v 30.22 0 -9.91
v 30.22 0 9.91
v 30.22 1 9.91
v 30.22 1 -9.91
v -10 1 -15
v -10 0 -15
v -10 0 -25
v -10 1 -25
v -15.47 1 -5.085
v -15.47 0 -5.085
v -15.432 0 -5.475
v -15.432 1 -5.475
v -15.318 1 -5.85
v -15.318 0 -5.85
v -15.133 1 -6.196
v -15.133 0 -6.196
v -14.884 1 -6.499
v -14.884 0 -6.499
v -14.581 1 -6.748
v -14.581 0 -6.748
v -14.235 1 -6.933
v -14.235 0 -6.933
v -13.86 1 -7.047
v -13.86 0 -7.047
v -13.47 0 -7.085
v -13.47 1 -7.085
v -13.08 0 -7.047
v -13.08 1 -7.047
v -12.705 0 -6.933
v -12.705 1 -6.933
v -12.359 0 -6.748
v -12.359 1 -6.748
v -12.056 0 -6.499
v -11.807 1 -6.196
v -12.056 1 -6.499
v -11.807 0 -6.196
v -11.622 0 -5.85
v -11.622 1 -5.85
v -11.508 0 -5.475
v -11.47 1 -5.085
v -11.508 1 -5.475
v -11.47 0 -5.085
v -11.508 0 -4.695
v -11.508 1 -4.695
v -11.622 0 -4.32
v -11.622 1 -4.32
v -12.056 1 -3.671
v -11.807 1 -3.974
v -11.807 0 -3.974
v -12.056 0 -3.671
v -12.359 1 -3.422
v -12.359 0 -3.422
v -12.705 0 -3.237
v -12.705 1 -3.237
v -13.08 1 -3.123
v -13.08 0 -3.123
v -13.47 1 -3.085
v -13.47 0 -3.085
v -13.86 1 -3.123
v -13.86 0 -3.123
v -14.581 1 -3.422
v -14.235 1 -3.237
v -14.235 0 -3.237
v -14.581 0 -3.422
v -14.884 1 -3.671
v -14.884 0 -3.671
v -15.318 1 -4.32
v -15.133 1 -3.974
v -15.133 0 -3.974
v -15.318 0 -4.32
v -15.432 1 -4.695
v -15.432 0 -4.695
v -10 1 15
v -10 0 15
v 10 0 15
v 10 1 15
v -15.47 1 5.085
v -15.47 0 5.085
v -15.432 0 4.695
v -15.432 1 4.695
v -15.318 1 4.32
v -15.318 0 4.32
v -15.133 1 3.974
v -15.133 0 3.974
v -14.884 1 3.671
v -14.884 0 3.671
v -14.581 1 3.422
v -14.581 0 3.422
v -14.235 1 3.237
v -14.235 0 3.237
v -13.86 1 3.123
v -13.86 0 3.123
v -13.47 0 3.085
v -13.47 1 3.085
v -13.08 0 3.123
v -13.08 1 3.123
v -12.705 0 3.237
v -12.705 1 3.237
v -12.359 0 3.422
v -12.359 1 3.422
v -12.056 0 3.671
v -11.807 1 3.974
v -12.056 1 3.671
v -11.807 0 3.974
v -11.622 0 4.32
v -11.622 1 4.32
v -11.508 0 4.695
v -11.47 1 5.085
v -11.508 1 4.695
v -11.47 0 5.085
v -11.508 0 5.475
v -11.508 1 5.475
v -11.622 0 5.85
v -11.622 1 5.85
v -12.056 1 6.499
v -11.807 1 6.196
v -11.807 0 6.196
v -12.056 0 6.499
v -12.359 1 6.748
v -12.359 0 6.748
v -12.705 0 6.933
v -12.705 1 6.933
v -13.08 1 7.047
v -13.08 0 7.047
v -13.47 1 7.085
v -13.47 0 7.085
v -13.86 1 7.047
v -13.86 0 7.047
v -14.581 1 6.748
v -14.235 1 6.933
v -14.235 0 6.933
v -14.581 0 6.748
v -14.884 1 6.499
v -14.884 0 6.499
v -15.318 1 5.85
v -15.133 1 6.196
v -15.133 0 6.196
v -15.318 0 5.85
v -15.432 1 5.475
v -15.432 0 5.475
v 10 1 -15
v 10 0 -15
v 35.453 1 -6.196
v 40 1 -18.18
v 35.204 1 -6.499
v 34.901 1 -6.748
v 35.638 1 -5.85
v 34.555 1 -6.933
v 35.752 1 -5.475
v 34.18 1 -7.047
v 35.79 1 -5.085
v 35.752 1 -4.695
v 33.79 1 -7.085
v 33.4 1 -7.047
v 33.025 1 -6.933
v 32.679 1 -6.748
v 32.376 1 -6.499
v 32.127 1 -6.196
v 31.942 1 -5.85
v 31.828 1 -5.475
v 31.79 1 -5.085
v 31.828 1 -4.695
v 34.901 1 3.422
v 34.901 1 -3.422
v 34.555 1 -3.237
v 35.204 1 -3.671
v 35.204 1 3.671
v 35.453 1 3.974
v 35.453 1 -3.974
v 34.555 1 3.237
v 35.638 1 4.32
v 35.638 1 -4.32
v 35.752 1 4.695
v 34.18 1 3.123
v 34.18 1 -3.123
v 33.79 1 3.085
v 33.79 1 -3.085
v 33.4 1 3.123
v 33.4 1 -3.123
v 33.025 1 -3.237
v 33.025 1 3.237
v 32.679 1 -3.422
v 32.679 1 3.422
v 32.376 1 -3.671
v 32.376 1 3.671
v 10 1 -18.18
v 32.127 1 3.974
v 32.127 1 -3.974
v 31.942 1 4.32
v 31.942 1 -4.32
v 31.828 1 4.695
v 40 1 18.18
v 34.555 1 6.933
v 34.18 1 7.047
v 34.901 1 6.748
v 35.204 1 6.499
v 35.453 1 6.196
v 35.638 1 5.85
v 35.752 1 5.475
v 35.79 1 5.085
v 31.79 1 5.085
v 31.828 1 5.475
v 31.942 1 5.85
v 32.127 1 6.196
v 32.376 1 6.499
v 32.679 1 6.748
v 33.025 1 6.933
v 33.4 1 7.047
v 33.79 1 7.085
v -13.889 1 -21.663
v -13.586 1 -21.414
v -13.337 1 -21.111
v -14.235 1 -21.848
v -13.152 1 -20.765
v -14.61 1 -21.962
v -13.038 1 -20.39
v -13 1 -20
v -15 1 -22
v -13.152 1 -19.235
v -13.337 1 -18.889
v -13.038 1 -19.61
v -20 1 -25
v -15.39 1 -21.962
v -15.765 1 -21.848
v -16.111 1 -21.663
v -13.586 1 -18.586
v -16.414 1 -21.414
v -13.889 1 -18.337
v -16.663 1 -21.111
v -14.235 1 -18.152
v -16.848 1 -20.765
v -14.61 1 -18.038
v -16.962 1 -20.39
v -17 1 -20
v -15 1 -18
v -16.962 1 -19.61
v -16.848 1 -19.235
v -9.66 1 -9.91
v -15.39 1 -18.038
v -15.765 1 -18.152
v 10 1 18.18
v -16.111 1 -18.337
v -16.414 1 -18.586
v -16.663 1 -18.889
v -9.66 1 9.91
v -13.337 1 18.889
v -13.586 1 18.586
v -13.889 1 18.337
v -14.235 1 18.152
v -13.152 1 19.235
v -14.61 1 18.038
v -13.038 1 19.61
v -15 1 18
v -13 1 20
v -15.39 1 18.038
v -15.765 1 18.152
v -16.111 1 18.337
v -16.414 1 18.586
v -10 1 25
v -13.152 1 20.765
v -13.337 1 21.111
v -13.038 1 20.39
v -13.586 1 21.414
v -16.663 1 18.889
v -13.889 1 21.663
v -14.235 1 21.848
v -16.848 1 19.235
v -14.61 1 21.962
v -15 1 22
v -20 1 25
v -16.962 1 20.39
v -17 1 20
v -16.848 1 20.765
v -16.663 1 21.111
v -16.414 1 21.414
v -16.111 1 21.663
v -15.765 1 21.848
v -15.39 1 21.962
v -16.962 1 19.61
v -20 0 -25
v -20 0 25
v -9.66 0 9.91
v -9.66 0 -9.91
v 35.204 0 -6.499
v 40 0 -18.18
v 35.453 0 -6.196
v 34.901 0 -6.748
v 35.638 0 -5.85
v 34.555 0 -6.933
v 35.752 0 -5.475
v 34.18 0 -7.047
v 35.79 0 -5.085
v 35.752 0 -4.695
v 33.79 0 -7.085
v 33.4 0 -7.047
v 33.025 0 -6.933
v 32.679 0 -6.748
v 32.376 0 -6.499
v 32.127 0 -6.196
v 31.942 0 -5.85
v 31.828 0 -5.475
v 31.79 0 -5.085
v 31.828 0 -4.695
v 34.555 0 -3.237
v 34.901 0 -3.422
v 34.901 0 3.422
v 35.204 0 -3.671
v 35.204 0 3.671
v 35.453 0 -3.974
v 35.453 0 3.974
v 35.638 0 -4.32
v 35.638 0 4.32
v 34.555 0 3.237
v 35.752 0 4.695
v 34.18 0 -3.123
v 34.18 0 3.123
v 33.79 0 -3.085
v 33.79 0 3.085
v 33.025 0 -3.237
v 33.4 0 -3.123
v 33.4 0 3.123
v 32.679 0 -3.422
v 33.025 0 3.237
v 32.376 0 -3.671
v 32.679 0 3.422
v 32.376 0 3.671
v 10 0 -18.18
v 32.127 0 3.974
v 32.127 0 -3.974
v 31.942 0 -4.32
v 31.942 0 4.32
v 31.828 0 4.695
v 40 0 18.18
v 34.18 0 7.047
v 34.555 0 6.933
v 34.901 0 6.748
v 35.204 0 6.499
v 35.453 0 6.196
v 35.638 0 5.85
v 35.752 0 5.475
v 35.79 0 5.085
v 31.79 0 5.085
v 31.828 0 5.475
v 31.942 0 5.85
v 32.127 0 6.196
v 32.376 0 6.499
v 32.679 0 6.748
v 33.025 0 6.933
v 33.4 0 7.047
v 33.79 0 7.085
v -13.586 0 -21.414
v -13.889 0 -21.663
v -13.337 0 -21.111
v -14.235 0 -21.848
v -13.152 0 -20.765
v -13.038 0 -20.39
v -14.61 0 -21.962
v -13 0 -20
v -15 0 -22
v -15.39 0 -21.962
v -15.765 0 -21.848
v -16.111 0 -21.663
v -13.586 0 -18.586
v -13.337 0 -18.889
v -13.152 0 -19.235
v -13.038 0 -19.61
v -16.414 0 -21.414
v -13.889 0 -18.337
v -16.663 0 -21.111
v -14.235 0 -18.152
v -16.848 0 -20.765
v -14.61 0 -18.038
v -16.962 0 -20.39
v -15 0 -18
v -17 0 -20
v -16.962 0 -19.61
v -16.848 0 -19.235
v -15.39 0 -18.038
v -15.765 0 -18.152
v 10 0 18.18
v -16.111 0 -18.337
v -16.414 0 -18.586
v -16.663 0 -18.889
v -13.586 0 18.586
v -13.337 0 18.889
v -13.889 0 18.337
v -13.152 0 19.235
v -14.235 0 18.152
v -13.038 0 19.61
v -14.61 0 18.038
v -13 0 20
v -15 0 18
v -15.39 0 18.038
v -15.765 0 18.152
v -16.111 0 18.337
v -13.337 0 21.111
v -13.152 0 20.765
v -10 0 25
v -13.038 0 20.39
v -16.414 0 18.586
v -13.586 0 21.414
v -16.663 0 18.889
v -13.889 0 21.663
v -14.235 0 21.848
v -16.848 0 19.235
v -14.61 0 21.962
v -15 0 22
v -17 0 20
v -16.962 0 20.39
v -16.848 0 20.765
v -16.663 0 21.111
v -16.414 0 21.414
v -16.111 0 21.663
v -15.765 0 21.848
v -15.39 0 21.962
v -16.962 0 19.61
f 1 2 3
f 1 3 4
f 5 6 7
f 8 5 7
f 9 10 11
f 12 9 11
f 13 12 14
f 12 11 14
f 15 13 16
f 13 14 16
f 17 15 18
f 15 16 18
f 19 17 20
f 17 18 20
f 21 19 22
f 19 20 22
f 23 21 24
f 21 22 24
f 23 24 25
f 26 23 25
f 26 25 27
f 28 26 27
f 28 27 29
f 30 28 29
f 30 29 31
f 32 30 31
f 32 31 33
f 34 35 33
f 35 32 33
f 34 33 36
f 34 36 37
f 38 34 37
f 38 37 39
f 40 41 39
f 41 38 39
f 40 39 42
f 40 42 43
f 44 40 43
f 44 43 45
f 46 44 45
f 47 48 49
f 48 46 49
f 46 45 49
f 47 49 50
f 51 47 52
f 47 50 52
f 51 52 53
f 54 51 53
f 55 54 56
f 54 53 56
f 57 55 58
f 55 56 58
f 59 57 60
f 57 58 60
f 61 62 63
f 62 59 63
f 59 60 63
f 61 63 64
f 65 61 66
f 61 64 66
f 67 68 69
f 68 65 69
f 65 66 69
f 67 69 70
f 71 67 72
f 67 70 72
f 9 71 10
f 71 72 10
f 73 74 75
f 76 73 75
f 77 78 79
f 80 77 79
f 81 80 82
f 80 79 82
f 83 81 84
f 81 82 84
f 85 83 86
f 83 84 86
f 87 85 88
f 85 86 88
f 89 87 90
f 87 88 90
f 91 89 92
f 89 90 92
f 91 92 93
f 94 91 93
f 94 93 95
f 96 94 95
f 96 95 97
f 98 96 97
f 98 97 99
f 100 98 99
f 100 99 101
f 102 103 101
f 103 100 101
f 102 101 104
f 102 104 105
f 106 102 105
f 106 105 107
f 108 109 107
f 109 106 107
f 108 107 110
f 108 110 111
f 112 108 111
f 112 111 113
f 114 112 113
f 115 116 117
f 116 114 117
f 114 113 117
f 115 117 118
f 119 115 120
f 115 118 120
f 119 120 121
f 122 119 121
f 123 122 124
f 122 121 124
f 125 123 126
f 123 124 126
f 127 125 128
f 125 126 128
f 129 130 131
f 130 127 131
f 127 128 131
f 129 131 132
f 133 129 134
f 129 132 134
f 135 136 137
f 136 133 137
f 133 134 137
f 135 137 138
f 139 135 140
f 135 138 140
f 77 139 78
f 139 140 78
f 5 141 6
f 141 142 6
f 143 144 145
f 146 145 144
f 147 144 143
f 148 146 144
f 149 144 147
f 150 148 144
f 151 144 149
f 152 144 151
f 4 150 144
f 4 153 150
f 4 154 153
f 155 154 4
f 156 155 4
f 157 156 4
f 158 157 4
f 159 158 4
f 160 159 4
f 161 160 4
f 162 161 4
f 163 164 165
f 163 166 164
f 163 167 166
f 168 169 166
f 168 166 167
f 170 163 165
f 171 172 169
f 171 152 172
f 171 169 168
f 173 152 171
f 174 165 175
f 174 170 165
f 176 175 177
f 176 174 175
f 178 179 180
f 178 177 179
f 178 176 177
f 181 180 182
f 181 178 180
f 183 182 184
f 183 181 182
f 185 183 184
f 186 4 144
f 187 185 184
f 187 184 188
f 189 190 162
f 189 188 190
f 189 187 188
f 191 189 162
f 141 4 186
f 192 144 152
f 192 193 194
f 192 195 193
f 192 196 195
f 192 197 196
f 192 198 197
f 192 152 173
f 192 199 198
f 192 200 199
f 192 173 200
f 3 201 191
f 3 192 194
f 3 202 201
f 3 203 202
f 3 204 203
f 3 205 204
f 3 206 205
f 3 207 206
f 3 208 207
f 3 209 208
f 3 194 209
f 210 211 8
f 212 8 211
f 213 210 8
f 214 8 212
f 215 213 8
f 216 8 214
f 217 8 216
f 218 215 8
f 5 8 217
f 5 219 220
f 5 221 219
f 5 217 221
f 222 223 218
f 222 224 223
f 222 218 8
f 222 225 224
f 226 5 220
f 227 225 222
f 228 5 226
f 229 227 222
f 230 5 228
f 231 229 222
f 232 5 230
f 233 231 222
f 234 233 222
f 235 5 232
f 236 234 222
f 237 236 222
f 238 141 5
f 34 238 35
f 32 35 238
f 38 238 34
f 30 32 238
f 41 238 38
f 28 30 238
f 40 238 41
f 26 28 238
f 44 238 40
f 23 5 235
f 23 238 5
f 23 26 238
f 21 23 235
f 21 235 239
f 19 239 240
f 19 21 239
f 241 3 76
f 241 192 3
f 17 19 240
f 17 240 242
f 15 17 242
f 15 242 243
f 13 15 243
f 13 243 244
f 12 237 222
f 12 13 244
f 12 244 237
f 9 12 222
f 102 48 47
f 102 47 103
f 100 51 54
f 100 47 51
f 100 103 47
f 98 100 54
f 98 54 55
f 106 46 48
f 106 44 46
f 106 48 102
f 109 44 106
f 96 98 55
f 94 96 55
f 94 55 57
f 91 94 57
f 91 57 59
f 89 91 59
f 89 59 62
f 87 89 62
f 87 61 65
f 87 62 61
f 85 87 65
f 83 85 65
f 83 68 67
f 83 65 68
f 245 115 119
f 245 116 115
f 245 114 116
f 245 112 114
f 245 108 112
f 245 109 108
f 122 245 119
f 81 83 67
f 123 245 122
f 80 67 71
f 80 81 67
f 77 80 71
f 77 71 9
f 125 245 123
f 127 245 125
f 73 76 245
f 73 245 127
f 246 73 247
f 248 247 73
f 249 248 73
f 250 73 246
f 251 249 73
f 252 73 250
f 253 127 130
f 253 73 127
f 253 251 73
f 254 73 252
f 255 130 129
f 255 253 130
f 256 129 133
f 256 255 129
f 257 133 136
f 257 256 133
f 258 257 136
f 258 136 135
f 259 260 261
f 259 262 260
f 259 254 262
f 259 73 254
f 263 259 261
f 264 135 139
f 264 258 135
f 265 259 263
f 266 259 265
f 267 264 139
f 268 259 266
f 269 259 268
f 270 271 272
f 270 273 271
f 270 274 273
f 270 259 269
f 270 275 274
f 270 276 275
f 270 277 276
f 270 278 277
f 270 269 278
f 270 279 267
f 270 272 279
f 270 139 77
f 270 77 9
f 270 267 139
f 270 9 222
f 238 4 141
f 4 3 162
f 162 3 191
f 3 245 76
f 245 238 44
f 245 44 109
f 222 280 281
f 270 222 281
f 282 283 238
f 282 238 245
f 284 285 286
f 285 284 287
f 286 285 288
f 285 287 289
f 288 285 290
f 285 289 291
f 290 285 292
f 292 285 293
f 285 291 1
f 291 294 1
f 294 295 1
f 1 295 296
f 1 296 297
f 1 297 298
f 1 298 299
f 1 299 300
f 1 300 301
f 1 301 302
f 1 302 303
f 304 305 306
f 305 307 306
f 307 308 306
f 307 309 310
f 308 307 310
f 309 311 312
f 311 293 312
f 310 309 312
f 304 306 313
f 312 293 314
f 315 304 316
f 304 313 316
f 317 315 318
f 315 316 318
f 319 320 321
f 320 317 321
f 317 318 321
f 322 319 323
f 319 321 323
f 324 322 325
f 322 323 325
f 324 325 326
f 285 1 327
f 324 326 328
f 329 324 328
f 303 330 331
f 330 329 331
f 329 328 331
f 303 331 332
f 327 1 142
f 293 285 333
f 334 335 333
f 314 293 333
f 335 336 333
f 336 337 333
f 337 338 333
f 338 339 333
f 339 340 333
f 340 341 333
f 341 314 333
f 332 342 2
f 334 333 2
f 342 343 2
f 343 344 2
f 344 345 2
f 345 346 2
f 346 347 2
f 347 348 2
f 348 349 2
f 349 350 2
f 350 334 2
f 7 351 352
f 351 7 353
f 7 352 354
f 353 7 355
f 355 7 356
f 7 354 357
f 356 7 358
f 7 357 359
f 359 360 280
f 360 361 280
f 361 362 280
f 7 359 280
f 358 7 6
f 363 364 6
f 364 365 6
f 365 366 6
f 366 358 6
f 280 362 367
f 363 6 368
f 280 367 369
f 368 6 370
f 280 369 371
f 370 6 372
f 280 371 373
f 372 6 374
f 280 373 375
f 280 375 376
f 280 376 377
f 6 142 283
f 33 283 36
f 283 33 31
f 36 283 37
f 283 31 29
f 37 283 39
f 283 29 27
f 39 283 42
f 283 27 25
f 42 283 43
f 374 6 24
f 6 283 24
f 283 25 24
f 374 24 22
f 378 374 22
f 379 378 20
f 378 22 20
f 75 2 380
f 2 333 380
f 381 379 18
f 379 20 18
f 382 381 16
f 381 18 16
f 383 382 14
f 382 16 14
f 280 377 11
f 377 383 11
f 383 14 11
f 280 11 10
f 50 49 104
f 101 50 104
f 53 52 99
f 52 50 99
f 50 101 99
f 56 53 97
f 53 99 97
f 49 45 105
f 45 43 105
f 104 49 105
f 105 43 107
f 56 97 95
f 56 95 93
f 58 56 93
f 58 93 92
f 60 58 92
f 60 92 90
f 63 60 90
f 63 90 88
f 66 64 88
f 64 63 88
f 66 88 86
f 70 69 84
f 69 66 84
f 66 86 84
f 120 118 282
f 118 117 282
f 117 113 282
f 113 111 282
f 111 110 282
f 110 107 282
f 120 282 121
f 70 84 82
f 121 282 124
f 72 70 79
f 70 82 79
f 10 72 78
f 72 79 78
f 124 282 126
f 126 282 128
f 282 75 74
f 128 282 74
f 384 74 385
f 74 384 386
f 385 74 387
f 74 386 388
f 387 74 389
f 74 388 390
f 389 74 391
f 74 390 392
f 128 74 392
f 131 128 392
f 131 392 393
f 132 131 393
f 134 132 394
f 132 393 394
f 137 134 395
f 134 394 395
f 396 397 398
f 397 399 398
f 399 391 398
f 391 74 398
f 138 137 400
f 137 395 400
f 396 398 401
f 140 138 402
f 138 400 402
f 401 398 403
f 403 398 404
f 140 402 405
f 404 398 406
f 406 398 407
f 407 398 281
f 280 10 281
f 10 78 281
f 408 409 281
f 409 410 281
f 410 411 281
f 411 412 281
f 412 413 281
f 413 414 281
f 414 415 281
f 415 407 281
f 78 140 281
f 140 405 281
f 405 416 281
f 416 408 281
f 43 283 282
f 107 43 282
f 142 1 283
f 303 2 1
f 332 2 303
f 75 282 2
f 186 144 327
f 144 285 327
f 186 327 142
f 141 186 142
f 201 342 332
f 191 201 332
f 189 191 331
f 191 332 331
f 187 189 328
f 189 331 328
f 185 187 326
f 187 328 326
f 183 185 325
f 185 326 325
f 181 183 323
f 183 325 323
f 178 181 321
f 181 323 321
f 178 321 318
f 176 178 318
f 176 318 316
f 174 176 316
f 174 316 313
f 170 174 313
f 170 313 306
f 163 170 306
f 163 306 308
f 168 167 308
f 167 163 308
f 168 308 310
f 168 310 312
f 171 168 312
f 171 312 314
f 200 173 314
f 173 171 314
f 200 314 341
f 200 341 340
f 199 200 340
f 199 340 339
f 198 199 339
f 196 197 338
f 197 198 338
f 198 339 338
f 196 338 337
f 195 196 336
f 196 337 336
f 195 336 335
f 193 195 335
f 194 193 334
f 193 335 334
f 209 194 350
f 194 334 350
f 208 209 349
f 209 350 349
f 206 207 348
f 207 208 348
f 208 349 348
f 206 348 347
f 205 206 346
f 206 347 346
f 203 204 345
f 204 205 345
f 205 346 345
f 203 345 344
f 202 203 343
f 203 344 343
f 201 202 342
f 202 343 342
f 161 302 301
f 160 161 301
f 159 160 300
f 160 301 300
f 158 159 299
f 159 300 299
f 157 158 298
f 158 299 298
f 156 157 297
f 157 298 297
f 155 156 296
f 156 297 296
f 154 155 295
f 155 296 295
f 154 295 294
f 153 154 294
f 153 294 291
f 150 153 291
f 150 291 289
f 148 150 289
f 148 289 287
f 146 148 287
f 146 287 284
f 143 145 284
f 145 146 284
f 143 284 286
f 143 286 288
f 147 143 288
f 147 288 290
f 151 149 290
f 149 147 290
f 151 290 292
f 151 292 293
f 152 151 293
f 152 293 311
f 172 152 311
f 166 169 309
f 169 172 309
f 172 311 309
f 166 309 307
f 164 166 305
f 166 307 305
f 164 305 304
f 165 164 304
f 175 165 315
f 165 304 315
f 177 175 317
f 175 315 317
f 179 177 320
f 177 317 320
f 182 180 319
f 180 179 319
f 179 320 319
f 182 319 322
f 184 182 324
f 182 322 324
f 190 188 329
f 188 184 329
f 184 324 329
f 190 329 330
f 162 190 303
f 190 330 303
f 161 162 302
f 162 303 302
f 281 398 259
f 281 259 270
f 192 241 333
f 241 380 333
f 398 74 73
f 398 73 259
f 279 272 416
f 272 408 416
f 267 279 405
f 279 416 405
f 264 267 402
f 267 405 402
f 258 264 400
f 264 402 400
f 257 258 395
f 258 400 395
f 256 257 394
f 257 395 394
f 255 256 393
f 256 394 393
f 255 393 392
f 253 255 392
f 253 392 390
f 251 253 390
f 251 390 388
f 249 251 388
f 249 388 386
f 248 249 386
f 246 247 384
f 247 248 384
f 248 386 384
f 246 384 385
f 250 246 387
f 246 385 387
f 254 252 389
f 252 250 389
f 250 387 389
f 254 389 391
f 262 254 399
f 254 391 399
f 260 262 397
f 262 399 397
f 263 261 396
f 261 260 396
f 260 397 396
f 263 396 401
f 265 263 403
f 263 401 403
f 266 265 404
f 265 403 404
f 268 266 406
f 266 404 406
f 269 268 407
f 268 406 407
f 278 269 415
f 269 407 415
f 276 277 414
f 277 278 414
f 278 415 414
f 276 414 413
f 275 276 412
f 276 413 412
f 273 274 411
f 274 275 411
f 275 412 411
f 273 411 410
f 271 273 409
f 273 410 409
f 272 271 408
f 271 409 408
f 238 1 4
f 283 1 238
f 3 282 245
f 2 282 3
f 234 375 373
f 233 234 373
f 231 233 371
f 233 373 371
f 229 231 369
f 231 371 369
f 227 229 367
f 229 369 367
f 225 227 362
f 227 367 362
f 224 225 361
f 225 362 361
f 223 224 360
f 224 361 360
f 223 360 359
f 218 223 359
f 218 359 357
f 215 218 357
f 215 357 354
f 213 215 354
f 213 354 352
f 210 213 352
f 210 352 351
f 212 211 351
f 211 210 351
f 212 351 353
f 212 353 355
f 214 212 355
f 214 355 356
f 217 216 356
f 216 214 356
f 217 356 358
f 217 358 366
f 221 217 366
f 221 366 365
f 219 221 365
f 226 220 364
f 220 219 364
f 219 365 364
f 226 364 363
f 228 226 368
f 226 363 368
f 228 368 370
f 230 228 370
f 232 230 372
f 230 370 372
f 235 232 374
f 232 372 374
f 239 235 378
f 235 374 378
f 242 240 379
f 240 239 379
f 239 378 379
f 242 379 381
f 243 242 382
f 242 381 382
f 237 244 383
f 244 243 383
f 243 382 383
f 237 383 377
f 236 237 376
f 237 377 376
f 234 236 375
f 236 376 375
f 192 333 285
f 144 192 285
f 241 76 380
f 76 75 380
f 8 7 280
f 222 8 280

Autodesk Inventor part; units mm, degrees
ref_plane "YZ Plane" through (0, 0, 0) normal (1, 0, 0) x (0, 1, 0)
ref_plane "XZ Plane" through (0, 0, 0) normal (0, 1, 0) x (-1, 0, 0)
ref_plane "XY Plane" through (0, 0, 0) normal (0, 0, 1) x (1, 0, 0)
sketch "Boceto1" plane through (0, 0, 0) normal (0, 1, 0) x (-1, 0, 0)
  circle A0 centre (0, 0) radius 5
  line L0 (9.66, 9.91) -> (-30.22, 9.91)
  line L1 (-30.22, 9.91) -> (-30.22, -9.91)
  line L2 (-30.22, -9.91) -> (9.66, -9.91)
  line L3 (9.66, -9.91) -> (9.66, 9.91)
  circle A1 centre (-33.79, 5.085) radius 2
  circle A2 centre (13.47, -5.085) radius 2
  circle A3 centre (13.47, 5.085) radius 2
  circle A4 centre (-33.79, -5.085) radius 2
  line L4 (20, 15) -> (-40, 15)
  line L5 (-40, 15) -> (-40, -15)
  line L6 (-40, -15) -> (20, -15)
  line L7 (20, -15) -> (20, 15)
  line L8 (20, -15) -> (10, -15)
  line L9 (10, -15) -> (10, -25)
  line L10 (10, -25) -> (20, -25)
  line L11 (20, -25) -> (20, -15)
  line L12 (20, 15) -> (10, 15)
  line L13 (10, 15) -> (10, 25)
  line L14 (10, 25) -> (20, 25)
  line L15 (20, 25) -> (20, 15)
  circle A5 centre (15, 20) radius 2
  circle A6 centre (15, -20) radius 2
  line L16 (-10, -15) -> (-40, -15)
  line L17 (-40, -15) -> (-40, -18.18)
  line L18 (-40, -18.18) -> (-10, -18.18)
  line L19 (-10, -18.18) -> (-10, -15)
  line L20 (-10, 18.18) -> (-40, 18.18)
  line L21 (-40, 18.18) -> (-40, 15)
  line L22 (-40, 15) -> (-10, 15)
  line L23 (-10, 15) -> (-10, 18.18)
  dimension "d0" = 10
  dimension "d1" = 9.91
  dimension "d2" = 19.82
  dimension "d3" = 9.66
  dimension "d4" = 39.88
  dimension "d5" = 4
  dimension "d6" = 4
  dimension "d7" = 4
  dimension "d8" = 5.085
  dimension "d9" = 10.17
  dimension "d10" = 13.47
  dimension "d11" = 13.47
  dimension "d12" = 4
  dimension "d13" = 33.79
  dimension "d14" = 33.79
  dimension "d15" = 5.085
  dimension "d16" = 10.17
  dimension "d25" = 15
  dimension "d26" = 30
  dimension "d27" = 60
  dimension "d28" = 40
  dimension "d29" = 10
  dimension "d30" = 10
  dimension "d31" = 10
  dimension "d32" = 4
  dimension "d33" = 4
  dimension "d34" = 5
  dimension "d35" = 5
  dimension "d36" = 5
  dimension "d37" = 5
  dimension "d38" = 3.18
  dimension "d39" = 30
extrude "Extrusión1" add sketch "Boceto1" along normal blind 1 contours L7 L6 L5 L4 | L4 L13 L14 L15 | L11 L10 L9 L6 | L4 L21 L20 L23 | L19 L18 L17 L6
properties part number "PINZA_SOST.SERVO"
